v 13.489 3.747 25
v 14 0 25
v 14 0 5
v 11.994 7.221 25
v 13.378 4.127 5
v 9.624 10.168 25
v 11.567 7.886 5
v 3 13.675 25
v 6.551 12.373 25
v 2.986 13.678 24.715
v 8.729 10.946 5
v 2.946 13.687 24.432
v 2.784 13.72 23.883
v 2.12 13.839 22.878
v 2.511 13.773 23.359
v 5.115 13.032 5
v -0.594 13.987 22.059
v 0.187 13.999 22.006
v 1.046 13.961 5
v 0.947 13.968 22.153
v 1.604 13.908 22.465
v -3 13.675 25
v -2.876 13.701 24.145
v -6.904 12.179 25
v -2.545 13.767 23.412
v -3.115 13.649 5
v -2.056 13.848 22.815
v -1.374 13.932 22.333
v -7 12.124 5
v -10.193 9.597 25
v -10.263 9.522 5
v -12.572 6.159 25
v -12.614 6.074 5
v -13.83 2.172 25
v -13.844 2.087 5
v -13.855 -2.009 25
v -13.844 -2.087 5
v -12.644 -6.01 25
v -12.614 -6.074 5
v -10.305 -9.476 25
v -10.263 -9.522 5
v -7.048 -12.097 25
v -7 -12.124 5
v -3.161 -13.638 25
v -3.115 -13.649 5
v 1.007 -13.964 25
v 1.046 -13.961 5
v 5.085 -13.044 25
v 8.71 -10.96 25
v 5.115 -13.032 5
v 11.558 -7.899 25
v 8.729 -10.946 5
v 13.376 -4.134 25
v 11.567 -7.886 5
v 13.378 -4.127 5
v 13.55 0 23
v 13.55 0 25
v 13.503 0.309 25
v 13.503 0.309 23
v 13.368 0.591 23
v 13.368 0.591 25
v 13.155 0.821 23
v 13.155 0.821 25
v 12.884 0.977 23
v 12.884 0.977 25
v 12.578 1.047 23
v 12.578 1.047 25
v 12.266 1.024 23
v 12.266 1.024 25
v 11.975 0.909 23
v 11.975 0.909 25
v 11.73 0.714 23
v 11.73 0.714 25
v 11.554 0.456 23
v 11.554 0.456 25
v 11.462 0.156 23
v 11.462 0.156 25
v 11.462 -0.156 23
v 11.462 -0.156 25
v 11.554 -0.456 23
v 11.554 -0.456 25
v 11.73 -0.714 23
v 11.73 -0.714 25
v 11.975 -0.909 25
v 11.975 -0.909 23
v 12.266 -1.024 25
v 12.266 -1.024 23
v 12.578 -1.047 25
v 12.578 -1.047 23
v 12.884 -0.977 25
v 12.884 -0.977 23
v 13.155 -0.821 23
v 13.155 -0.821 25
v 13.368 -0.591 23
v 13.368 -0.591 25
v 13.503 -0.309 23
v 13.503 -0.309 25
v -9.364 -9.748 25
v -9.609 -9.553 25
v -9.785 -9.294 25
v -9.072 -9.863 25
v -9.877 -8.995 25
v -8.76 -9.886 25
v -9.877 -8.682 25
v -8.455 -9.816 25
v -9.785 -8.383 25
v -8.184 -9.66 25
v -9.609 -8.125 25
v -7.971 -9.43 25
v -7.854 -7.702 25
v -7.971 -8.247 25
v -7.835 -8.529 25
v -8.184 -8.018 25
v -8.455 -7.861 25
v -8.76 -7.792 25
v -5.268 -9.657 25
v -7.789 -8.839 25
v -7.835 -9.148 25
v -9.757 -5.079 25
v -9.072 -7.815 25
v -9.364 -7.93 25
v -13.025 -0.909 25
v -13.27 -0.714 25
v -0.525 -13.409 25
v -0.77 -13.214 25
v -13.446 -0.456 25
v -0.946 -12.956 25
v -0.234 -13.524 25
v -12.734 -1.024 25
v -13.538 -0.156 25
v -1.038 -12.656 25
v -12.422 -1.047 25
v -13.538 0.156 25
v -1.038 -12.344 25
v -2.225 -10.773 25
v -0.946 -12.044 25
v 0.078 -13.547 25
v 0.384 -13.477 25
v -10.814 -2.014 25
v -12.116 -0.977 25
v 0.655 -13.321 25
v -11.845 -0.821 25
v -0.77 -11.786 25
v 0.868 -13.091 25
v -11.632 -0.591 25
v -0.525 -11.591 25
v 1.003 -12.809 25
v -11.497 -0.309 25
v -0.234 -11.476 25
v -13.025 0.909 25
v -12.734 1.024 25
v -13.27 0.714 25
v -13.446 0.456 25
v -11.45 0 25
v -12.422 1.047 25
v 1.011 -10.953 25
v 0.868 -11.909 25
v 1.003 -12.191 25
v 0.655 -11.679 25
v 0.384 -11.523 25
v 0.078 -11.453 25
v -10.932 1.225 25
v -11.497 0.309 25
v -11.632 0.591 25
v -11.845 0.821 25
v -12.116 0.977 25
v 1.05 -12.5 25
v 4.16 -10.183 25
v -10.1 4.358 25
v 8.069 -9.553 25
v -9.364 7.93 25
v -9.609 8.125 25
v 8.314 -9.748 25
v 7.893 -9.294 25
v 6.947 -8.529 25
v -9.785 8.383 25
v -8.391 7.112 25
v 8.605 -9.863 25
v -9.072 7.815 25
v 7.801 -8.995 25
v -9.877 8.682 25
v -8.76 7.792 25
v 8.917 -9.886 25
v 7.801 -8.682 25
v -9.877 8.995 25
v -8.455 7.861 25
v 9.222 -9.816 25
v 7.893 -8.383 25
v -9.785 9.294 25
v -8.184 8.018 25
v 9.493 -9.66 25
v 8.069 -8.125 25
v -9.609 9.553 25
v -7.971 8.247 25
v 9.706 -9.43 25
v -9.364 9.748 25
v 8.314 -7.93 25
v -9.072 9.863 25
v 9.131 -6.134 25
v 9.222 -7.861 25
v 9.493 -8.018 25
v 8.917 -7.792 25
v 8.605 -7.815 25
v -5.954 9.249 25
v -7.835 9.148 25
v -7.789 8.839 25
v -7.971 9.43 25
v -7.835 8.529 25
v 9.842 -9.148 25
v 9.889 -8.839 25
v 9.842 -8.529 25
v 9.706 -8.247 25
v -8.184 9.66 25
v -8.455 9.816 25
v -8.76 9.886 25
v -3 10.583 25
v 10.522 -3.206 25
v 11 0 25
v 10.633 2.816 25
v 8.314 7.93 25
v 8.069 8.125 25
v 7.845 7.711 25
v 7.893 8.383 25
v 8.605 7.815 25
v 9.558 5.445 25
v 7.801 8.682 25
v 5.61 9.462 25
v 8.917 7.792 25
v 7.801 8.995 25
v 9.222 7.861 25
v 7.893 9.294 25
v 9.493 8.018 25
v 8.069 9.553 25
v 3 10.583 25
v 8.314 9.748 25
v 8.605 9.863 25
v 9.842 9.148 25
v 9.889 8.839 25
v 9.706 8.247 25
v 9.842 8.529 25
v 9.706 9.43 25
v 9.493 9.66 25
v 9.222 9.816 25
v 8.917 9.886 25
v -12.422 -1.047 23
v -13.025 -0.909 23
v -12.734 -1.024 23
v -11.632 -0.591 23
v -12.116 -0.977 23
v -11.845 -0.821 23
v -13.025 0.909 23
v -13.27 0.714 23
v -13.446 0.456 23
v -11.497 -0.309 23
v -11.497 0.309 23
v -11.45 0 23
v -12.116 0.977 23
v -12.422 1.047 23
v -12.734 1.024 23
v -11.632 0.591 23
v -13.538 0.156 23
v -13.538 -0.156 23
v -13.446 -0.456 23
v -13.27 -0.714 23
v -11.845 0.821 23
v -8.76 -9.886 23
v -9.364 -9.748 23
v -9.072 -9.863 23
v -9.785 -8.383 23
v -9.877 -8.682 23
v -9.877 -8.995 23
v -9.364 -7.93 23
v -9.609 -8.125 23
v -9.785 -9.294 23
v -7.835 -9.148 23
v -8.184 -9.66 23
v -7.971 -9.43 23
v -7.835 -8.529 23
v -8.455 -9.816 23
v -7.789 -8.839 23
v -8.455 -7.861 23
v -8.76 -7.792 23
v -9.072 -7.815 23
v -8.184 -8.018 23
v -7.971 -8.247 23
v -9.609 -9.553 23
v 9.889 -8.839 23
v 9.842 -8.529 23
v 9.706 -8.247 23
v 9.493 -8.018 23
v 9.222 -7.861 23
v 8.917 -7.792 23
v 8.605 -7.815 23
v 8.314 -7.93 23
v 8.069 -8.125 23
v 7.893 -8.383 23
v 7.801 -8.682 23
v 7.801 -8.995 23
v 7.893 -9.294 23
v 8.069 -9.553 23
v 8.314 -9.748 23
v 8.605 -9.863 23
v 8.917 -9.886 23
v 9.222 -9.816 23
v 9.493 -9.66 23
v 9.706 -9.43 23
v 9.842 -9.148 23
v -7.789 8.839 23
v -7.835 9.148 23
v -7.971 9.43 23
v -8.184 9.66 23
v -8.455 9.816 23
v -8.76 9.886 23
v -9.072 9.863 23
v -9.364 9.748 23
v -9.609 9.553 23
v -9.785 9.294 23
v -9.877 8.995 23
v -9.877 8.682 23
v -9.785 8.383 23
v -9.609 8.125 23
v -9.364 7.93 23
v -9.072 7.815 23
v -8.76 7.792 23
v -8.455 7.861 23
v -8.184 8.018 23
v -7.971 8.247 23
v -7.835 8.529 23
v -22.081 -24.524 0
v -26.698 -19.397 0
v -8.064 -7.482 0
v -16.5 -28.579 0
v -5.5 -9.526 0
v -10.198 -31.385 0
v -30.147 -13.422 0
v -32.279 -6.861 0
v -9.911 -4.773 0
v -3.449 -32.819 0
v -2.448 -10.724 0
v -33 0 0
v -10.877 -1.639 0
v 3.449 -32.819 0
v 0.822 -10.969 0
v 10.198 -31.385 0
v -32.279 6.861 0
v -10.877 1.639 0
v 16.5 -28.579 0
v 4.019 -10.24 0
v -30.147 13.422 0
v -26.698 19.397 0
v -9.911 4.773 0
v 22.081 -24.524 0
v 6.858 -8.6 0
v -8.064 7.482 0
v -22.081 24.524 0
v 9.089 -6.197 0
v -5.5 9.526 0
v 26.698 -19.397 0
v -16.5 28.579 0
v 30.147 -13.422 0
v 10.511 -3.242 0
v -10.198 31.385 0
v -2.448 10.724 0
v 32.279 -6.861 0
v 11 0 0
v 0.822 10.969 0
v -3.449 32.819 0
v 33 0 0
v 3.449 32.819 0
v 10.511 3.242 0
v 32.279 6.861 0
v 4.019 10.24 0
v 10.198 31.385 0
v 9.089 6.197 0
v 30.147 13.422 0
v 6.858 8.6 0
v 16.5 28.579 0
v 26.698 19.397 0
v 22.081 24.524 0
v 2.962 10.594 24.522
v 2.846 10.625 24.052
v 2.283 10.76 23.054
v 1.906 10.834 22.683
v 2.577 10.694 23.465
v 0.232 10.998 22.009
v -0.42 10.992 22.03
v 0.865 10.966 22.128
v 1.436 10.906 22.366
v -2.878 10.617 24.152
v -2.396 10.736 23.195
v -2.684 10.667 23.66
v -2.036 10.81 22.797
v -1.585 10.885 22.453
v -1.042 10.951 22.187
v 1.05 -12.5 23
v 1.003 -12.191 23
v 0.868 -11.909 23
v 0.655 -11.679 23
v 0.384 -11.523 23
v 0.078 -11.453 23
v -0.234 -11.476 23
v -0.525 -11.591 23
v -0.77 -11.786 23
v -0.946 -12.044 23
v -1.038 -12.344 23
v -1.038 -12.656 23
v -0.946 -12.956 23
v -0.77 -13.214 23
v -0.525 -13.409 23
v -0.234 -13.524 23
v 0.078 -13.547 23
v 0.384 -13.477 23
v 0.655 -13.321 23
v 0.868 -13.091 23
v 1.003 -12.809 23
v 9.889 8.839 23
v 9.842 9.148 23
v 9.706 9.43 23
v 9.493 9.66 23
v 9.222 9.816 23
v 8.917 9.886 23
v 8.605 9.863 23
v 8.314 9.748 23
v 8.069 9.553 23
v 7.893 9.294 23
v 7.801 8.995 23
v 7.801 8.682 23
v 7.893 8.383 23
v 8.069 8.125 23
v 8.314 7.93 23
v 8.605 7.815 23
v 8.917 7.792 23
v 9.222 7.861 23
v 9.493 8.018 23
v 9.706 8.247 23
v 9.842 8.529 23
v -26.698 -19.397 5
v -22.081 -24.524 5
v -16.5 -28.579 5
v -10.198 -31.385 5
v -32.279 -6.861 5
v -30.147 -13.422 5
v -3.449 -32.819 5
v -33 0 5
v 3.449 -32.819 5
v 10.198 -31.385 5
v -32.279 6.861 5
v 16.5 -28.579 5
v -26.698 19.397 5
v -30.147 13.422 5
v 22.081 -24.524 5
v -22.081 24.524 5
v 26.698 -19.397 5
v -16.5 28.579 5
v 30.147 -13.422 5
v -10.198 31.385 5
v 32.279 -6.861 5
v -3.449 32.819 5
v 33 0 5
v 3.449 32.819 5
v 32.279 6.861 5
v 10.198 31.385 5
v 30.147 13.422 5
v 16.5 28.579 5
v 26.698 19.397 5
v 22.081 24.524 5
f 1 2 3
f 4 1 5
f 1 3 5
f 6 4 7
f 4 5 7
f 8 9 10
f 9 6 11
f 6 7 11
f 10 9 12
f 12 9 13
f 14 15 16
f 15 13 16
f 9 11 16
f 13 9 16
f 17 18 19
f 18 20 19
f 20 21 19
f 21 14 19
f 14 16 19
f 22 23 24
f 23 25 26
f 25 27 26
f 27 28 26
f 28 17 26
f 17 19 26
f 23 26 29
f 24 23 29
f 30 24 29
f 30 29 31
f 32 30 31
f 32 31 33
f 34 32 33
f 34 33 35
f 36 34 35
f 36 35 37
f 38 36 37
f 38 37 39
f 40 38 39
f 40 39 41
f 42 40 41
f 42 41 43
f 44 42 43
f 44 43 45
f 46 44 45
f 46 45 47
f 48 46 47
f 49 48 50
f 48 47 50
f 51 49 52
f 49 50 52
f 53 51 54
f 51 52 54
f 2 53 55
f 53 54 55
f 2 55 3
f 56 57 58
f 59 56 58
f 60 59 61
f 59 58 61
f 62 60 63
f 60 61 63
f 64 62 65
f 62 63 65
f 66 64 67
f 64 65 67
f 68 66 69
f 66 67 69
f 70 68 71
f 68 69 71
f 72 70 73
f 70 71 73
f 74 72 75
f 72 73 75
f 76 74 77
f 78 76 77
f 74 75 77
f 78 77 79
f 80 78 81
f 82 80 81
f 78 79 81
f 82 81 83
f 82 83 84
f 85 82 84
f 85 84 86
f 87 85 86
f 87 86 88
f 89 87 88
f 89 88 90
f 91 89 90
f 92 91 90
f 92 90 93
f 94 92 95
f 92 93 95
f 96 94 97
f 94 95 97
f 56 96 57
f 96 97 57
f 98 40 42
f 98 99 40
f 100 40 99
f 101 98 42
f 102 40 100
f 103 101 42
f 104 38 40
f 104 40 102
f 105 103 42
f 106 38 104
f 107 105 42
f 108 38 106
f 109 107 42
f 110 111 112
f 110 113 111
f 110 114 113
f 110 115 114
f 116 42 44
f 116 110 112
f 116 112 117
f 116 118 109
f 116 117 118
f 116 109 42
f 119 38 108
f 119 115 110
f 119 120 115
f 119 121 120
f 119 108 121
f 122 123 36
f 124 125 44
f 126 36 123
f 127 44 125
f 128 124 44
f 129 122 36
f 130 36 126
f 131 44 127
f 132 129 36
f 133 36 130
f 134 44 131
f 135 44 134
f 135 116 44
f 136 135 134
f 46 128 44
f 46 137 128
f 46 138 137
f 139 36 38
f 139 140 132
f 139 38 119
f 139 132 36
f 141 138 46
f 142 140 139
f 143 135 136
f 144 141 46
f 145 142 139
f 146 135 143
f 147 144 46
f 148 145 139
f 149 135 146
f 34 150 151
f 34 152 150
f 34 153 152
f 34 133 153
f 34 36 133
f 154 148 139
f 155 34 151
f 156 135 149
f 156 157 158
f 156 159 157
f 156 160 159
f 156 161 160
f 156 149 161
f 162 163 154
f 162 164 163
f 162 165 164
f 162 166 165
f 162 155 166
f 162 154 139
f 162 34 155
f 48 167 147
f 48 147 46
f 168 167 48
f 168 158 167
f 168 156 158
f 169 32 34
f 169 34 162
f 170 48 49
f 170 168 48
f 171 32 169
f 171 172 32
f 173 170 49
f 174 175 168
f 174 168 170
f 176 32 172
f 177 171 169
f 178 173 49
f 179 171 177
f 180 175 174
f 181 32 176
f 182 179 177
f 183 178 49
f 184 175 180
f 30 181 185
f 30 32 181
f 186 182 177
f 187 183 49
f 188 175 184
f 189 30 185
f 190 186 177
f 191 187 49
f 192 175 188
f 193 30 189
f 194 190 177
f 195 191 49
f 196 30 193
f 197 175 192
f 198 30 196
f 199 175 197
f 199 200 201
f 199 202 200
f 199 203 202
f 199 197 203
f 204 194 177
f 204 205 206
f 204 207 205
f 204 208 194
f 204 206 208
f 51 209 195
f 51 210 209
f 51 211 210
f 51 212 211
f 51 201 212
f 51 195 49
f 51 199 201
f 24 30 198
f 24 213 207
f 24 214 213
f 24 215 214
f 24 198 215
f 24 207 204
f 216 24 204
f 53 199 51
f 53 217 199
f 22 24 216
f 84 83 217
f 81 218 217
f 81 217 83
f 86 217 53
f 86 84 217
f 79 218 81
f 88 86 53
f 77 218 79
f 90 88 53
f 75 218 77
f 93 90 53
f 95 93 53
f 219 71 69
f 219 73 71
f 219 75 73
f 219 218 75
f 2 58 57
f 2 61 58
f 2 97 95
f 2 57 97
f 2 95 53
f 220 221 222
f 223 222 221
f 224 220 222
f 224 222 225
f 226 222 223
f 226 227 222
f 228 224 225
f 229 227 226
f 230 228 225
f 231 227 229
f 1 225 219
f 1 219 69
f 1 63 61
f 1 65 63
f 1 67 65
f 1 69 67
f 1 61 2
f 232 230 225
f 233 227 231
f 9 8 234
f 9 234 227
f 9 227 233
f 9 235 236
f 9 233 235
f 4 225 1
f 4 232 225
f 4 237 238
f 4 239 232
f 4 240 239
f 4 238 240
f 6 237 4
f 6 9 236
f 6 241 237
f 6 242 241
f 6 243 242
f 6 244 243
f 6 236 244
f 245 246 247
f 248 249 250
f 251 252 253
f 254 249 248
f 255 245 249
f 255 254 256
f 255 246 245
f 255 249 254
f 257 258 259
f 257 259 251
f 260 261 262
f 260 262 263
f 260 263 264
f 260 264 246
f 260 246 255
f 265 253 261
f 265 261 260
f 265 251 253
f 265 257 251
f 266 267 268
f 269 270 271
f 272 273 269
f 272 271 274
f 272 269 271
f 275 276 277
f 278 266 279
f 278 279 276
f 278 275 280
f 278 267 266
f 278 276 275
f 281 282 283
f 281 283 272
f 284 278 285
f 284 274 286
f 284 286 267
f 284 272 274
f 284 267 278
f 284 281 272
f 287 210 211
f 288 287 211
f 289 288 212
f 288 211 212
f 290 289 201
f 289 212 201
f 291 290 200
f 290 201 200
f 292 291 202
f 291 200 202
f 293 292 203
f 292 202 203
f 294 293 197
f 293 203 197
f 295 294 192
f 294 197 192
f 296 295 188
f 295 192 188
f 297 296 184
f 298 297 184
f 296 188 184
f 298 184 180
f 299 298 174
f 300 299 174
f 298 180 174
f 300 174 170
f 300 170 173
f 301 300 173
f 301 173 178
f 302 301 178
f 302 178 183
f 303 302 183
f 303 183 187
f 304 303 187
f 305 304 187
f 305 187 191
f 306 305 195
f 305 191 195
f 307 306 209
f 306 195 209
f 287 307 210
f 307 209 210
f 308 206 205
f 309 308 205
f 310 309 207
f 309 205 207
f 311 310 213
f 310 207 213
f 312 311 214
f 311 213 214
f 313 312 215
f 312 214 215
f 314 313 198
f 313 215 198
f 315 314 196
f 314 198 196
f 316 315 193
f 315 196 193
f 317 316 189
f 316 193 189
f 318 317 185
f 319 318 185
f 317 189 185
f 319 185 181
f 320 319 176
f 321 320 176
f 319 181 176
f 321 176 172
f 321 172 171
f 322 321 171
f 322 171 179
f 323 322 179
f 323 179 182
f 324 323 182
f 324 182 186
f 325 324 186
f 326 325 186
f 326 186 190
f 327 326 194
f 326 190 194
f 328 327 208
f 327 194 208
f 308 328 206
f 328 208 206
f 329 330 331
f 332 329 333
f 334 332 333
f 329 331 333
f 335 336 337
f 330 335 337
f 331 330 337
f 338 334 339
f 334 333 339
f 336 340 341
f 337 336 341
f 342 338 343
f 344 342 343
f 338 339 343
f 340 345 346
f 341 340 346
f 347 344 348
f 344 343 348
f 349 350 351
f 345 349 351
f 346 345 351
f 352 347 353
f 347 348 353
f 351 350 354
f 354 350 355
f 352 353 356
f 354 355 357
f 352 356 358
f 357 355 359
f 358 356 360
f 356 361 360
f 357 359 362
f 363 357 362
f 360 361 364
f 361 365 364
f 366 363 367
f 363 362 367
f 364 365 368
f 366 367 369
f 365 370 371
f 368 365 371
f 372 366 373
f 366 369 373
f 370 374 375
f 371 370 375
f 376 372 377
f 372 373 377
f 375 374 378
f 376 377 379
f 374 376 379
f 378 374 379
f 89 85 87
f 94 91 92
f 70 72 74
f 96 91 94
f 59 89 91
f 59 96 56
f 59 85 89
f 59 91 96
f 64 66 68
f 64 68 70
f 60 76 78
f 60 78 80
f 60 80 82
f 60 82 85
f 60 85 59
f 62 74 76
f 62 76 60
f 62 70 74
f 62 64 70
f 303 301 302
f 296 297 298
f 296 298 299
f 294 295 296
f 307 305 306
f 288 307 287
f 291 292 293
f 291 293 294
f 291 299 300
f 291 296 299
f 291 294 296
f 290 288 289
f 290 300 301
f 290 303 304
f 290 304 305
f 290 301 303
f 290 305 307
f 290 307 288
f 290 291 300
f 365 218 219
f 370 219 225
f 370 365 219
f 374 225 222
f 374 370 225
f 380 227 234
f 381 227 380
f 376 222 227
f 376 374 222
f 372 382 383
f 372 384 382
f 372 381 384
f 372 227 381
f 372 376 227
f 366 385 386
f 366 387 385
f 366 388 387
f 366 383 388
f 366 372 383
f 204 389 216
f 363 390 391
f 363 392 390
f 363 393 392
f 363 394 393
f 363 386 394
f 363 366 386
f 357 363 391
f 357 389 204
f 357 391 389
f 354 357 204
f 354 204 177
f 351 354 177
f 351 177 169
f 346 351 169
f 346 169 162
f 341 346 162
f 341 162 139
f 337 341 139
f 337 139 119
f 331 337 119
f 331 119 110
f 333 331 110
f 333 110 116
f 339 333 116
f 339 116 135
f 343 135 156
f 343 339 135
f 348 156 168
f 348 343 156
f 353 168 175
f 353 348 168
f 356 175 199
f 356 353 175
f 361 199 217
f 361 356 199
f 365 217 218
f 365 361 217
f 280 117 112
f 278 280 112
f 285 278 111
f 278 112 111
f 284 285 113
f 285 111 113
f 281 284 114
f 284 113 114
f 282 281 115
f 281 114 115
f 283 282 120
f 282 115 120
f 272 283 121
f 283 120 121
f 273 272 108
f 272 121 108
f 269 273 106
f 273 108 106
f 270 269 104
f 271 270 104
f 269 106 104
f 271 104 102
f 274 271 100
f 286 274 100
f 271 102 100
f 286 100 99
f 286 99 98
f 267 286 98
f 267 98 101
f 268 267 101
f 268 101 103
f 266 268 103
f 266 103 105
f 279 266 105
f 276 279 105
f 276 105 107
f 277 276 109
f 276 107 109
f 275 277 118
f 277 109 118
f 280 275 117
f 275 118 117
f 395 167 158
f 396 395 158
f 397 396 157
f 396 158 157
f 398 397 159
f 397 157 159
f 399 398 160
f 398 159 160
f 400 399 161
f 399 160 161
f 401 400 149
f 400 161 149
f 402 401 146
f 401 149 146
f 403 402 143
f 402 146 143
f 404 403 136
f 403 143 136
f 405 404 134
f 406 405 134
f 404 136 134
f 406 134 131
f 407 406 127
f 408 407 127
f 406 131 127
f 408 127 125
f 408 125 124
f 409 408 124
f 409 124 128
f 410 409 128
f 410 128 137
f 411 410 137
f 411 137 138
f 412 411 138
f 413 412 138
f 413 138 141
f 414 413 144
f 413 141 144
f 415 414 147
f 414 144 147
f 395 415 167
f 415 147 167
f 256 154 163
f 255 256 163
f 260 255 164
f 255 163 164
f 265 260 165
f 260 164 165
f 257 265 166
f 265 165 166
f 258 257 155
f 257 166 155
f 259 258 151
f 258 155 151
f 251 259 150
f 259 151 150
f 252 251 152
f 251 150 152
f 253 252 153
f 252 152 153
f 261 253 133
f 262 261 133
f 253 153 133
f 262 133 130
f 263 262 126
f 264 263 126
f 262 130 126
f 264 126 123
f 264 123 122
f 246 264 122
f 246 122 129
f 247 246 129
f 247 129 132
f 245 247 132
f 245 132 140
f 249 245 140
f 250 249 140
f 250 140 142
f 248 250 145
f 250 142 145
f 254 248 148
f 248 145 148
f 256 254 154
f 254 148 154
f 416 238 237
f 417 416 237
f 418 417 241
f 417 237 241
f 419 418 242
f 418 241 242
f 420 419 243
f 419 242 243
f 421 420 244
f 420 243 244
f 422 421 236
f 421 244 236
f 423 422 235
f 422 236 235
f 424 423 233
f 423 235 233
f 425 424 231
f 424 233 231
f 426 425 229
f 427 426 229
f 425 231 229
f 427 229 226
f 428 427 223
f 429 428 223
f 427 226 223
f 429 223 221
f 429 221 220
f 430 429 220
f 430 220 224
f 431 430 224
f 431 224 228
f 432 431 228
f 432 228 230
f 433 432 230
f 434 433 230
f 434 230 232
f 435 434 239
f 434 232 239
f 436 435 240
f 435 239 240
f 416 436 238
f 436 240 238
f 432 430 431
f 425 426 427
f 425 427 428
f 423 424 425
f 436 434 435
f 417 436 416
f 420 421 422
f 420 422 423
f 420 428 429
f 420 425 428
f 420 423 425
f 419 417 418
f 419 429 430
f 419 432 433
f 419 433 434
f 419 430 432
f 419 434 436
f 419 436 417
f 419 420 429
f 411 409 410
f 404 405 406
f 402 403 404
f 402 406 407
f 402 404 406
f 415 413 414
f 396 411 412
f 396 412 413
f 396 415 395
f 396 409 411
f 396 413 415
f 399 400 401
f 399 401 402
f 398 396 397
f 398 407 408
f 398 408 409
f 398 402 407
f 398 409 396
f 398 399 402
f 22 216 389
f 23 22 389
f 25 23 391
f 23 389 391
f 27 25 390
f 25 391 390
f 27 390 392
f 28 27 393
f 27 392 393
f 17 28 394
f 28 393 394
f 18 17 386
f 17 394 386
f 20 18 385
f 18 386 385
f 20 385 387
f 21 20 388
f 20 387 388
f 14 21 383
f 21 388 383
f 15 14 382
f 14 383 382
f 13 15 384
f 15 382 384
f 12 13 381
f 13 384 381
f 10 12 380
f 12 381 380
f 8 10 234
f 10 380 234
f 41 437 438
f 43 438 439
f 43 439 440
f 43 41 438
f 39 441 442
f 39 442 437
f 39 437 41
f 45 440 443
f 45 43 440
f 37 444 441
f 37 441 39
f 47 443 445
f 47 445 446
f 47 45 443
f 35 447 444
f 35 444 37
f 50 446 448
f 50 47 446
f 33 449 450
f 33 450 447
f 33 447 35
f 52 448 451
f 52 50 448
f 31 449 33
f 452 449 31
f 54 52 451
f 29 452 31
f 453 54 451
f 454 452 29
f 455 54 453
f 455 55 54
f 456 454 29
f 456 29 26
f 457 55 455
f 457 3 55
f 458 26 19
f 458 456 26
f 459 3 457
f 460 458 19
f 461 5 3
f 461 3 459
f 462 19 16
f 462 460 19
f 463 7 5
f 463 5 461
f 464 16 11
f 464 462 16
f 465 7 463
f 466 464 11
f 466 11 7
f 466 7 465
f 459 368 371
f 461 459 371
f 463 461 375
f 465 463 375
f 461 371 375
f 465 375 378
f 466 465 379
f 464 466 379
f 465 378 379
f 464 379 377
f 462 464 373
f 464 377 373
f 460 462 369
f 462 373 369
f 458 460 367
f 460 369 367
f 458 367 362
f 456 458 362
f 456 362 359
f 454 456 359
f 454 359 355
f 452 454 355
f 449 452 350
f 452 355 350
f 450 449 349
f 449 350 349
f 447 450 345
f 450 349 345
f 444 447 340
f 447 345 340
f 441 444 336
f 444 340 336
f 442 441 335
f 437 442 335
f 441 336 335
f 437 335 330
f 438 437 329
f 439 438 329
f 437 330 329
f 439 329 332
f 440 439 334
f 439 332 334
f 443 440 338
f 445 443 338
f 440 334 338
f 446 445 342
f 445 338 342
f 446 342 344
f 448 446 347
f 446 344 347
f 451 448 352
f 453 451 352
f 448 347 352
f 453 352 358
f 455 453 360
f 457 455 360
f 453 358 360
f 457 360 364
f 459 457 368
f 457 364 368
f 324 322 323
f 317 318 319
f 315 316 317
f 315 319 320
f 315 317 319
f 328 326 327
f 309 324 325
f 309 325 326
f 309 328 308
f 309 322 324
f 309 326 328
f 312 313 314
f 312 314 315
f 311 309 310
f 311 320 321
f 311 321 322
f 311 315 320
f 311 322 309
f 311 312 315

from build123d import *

# Parameters (mm, degrees)
F0_R     = 14
F0_R_2   = 11
F1_DEPTH = 25
F0_R_3   = 33
F2_DEPTH = 5
F3_R     = 3
F4_DEPTH = 25
F6_R     = 1.05
F7_DEPTH = 2


with BuildPart() as f1:
    # F0 (on Top) → F1 (new body)
    with BuildSketch(Plane.XY):
        Circle(F0_R)
        Circle(F0_R_2, mode=Mode.SUBTRACT)
    extrude(amount=F1_DEPTH)

    # F0 (on Top) → F2 (join)
    with BuildSketch(Plane.XY):
        Circle(F0_R_3)
        Circle(F0_R, mode=Mode.SUBTRACT)
    extrude(amount=F2_DEPTH)

    # F3 (on Front) → F4 (cut)
    with BuildSketch(Plane.XZ):
        with Locations((0, 25)):
            Circle(F3_R)
    extrude(amount=-F4_DEPTH, mode=Mode.SUBTRACT)

    # F6 (on offset) → F7 (cut)
    with BuildSketch(Plane.XY.offset(25)):
        with Locations((-8.8388347648, 8.8388347648)):
            Circle(F6_R)
        with Locations((8.8388347648, 8.8388347648)):
            Circle(F6_R)
        with Locations((12.5, 0)):
            Circle(F6_R)
        with Locations((8.8388347648, -8.8388347648)):
            Circle(F6_R)
        with Locations((0, -12.5)):
            Circle(F6_R)
        with Locations((-8.8388347648, -8.8388347648)):
            Circle(F6_R)
        with Locations((-12.5, 0)):
            Circle(F6_R)
    extrude(amount=-F7_DEPTH, mode=Mode.SUBTRACT)


solid = f1.part
